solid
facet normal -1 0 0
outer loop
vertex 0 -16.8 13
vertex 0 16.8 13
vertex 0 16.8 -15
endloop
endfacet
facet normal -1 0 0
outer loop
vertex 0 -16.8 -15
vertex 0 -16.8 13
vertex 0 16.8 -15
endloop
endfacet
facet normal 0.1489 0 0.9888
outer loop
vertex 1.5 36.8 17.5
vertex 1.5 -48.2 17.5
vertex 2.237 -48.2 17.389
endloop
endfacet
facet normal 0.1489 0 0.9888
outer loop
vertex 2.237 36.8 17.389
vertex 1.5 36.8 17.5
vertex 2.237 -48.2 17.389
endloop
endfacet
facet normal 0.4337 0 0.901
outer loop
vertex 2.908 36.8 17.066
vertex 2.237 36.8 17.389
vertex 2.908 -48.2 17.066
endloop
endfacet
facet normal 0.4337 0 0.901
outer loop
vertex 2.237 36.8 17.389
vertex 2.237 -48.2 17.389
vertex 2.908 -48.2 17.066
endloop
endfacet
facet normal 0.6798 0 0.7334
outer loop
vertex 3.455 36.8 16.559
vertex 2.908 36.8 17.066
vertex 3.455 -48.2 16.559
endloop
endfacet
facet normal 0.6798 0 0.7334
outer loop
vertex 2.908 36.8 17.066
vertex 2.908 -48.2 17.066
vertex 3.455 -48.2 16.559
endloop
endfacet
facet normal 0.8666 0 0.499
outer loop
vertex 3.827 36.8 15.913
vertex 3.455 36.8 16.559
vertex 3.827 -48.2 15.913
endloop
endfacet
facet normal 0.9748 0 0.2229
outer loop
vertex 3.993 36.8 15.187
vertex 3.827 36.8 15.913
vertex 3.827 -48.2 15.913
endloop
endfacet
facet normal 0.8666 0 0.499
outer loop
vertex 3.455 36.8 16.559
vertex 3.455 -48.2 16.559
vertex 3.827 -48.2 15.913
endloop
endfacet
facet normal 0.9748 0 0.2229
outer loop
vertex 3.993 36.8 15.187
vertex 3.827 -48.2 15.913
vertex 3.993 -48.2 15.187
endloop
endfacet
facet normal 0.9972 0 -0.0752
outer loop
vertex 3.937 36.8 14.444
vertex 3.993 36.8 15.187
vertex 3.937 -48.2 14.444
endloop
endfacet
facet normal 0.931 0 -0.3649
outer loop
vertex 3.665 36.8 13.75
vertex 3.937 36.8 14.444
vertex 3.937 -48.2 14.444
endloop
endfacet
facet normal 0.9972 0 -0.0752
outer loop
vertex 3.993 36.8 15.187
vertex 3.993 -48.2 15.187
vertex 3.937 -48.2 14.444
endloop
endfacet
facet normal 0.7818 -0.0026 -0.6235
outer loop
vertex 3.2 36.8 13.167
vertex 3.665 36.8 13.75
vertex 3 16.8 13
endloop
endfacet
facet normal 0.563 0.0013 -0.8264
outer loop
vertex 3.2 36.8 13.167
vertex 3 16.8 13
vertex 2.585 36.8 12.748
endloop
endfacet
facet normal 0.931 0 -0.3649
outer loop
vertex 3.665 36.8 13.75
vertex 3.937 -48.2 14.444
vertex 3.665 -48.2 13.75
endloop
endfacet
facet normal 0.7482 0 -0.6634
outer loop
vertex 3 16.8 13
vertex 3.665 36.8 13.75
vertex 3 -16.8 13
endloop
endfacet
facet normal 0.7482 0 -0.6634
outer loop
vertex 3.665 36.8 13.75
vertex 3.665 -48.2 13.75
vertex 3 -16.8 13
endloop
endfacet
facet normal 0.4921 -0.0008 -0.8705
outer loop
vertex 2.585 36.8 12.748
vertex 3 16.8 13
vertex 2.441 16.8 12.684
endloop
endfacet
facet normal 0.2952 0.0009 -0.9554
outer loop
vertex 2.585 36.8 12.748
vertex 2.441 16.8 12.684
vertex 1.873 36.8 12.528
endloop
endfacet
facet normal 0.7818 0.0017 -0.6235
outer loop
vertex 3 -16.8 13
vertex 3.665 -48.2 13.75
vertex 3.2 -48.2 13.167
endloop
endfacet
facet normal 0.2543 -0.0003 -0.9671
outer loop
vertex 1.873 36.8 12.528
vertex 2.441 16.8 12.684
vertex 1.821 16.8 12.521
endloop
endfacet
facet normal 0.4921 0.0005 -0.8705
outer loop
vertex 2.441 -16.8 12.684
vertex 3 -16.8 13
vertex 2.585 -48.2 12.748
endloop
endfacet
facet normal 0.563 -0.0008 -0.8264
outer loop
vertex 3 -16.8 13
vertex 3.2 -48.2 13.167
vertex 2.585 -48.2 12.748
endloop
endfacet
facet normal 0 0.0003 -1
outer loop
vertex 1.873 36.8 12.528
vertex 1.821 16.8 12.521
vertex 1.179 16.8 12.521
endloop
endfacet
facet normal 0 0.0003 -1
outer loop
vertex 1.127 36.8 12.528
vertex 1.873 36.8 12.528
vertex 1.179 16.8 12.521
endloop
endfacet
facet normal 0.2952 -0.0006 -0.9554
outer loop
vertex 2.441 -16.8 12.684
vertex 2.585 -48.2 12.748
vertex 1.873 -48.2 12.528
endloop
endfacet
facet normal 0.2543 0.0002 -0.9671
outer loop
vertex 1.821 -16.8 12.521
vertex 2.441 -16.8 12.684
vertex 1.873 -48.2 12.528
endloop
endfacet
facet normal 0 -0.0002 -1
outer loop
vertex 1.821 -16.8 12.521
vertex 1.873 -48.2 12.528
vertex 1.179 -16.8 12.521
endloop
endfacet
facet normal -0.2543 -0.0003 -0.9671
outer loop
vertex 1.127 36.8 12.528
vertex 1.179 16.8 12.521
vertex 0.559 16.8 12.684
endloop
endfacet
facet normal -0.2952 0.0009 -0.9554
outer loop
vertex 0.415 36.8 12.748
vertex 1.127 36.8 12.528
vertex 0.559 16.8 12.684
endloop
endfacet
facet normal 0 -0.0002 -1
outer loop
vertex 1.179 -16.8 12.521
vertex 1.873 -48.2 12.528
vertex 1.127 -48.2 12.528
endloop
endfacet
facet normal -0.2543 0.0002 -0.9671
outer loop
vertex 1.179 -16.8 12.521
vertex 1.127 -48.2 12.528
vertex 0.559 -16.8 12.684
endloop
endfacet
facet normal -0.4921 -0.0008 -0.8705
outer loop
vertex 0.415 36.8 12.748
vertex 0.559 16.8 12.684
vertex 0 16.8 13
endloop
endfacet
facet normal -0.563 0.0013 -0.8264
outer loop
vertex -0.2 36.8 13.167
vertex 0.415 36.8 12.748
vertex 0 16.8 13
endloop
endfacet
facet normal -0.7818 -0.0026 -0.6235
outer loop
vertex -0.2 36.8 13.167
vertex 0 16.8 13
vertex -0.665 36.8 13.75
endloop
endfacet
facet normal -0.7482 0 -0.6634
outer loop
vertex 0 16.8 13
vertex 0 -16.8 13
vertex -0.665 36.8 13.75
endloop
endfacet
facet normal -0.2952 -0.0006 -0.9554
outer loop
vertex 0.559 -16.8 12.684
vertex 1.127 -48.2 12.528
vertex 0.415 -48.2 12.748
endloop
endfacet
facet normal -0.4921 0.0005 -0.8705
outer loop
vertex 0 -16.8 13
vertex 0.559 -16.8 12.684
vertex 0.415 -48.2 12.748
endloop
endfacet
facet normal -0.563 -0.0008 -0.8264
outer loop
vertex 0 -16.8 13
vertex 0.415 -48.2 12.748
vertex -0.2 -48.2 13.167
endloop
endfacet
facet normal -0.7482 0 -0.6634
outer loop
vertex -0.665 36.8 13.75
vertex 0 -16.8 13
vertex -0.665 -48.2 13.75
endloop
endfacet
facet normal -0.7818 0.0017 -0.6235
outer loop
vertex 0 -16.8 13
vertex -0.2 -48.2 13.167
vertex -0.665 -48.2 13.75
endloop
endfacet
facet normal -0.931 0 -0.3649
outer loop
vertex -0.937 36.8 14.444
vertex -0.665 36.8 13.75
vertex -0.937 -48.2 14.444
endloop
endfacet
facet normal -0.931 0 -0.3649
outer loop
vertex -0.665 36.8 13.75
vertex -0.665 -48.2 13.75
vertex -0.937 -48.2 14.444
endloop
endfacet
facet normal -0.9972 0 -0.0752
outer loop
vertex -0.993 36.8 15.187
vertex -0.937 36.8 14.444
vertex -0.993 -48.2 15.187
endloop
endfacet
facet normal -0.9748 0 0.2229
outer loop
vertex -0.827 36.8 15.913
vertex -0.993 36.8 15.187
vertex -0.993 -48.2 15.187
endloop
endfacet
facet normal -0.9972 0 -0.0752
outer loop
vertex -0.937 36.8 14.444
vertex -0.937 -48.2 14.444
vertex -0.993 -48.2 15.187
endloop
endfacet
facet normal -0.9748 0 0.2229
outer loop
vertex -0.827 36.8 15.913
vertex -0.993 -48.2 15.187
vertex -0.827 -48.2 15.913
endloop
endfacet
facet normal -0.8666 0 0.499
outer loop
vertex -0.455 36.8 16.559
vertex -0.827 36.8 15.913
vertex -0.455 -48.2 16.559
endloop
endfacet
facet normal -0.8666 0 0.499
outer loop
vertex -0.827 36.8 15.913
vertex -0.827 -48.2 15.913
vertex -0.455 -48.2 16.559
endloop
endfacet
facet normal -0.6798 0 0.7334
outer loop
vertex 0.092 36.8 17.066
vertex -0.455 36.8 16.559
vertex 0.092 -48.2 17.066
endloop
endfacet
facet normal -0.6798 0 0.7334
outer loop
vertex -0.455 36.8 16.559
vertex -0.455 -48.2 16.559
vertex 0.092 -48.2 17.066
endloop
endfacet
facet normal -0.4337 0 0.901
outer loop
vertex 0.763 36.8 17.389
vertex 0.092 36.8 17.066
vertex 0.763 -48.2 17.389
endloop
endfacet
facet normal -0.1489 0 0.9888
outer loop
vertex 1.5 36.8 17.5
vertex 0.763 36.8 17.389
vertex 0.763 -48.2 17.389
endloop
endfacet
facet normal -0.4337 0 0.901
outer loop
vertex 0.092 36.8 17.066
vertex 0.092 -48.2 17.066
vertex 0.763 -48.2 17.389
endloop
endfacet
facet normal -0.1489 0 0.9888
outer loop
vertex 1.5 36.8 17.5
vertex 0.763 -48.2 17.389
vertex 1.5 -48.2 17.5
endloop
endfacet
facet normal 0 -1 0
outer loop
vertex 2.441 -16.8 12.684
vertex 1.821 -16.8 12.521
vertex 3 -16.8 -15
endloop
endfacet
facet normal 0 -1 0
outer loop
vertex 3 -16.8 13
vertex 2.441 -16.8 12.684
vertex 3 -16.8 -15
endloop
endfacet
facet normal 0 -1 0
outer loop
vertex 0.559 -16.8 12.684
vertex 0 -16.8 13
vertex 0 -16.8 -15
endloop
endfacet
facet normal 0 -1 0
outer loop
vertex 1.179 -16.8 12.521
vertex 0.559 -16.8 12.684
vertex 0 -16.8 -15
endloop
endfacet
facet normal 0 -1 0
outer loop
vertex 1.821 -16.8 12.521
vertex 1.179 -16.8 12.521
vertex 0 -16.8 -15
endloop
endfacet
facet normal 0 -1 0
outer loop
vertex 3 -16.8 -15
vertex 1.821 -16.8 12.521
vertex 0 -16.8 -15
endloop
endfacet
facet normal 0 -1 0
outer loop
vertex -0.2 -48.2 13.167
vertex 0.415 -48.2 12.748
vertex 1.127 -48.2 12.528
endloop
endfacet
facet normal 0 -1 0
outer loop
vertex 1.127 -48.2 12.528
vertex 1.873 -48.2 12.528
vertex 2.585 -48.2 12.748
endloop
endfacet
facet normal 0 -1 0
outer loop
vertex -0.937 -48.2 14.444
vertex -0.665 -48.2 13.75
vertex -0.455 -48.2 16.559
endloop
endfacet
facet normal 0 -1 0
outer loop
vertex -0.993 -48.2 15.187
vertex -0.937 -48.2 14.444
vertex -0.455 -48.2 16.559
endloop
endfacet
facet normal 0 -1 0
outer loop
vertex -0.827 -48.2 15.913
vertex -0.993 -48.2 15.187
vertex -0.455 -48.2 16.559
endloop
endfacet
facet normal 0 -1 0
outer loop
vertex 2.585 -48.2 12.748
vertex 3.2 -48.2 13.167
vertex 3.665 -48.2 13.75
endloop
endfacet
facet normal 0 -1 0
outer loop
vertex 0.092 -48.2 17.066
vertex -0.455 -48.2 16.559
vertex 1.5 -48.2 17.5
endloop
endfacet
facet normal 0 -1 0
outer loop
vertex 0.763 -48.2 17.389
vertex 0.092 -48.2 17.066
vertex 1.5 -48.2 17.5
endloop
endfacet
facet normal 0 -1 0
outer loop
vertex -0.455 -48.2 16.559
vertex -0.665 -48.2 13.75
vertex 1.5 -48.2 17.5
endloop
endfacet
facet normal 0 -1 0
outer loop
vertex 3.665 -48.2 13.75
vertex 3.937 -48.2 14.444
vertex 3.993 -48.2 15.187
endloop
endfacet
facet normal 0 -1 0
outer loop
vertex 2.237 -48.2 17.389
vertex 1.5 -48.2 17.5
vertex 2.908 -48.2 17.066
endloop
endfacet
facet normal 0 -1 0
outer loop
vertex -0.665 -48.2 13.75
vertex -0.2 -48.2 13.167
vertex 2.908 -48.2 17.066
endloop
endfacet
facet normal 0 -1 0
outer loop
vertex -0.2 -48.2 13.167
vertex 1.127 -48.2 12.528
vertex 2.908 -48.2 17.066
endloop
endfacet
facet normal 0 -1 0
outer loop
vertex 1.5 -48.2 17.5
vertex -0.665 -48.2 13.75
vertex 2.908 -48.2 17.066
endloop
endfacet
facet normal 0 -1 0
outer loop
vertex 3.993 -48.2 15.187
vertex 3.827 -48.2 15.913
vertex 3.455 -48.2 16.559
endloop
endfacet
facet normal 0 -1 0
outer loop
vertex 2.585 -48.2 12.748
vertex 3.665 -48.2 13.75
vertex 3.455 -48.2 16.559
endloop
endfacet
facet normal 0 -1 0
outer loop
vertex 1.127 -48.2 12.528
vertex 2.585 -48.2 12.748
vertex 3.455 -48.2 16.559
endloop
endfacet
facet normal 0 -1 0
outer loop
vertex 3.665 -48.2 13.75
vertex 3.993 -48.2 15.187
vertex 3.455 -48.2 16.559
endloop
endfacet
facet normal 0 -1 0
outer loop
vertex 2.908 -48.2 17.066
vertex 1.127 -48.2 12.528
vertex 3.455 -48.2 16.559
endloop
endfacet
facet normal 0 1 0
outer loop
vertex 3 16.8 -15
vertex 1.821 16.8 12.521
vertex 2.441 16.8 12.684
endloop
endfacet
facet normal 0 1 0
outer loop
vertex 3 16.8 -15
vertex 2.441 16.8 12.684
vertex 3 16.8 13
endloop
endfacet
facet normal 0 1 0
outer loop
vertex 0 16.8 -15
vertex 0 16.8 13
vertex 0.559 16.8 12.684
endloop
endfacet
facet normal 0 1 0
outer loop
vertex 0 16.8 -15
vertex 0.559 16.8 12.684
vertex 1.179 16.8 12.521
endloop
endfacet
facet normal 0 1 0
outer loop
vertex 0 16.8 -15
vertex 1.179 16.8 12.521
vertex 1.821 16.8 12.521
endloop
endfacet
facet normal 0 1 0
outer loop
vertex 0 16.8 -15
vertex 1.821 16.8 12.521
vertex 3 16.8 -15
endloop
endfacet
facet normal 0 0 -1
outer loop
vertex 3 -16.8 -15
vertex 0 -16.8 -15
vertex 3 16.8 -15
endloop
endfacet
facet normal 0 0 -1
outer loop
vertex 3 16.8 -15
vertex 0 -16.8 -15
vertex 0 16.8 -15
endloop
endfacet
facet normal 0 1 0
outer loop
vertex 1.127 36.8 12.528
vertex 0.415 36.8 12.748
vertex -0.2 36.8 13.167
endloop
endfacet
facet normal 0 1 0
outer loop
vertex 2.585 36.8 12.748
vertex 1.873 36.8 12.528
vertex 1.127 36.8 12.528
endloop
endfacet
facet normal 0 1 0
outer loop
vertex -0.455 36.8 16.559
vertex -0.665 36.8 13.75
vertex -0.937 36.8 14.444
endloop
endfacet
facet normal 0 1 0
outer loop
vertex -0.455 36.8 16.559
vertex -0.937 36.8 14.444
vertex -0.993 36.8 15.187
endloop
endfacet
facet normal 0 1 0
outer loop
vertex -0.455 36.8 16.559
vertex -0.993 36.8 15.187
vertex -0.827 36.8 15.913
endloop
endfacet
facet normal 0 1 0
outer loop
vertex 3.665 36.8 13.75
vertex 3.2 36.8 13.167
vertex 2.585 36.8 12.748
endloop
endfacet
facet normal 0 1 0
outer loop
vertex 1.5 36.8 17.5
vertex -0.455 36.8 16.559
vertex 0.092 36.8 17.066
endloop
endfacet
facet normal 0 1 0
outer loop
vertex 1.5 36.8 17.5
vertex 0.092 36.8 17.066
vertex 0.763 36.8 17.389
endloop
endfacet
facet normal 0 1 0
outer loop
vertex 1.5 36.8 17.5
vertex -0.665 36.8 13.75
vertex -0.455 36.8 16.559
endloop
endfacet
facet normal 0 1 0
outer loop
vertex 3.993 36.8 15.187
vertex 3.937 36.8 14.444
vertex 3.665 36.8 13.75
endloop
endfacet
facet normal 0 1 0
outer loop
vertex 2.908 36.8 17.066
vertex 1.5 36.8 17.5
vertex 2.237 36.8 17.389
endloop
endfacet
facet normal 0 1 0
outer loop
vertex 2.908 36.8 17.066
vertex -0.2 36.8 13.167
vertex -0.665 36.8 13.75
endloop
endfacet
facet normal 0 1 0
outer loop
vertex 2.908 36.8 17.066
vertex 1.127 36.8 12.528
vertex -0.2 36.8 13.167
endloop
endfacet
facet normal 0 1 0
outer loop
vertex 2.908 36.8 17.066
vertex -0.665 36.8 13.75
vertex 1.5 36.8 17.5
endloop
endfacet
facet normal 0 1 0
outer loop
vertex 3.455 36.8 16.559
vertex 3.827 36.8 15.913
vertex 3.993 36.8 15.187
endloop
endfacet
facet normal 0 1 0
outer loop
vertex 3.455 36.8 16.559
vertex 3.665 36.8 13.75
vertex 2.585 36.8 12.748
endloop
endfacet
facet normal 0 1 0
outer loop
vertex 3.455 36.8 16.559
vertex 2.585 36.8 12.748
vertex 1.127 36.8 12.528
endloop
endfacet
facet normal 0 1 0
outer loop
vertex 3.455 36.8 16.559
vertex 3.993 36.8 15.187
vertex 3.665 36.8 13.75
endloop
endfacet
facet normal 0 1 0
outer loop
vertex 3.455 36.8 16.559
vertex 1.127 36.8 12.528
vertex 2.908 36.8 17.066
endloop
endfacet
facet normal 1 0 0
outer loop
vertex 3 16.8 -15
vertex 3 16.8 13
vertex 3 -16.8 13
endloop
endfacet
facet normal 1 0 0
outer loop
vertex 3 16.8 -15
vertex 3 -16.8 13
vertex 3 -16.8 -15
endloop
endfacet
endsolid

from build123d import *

# Parameters (mm, degrees)
CROQUIS1_W                   = 30
CROQUIS1_H                   = 33.6
SALIENTE_EXTRUIR1_DEPTH      = 3
SALIENTE_EXTRUIR2_DEPTH      = 20
SALIENTE_EXTRUIR2_DEPTH_BACK = 65
CROQUIS2_R                   = 2.5


with BuildPart() as part:
    # Croquis1 → Saliente-Extruir1 (new body)
    with BuildSketch(Plane(origin=(0, 0, 0), x_dir=(0, 0, -1), z_dir=(1, 0, 0))):
        Rectangle(CROQUIS1_W, CROQUIS1_H)
    extrude(amount=SALIENTE_EXTRUIR1_DEPTH)

    # Croquis2 → Saliente-Extruir2 (add, two sides: drawn at the far end of the back side and taken through both)
    with BuildSketch(Plane(origin=(0, 16.8, 0), x_dir=(1, 0, 0), z_dir=(0, 1, 0)).offset(-SALIENTE_EXTRUIR2_DEPTH_BACK)):
        with Locations(Location((1.5, -15, 0), (0, 0, 270))):
            Circle(CROQUIS2_R)
    extrude(amount=SALIENTE_EXTRUIR2_DEPTH + SALIENTE_EXTRUIR2_DEPTH_BACK)


solid = part.part
